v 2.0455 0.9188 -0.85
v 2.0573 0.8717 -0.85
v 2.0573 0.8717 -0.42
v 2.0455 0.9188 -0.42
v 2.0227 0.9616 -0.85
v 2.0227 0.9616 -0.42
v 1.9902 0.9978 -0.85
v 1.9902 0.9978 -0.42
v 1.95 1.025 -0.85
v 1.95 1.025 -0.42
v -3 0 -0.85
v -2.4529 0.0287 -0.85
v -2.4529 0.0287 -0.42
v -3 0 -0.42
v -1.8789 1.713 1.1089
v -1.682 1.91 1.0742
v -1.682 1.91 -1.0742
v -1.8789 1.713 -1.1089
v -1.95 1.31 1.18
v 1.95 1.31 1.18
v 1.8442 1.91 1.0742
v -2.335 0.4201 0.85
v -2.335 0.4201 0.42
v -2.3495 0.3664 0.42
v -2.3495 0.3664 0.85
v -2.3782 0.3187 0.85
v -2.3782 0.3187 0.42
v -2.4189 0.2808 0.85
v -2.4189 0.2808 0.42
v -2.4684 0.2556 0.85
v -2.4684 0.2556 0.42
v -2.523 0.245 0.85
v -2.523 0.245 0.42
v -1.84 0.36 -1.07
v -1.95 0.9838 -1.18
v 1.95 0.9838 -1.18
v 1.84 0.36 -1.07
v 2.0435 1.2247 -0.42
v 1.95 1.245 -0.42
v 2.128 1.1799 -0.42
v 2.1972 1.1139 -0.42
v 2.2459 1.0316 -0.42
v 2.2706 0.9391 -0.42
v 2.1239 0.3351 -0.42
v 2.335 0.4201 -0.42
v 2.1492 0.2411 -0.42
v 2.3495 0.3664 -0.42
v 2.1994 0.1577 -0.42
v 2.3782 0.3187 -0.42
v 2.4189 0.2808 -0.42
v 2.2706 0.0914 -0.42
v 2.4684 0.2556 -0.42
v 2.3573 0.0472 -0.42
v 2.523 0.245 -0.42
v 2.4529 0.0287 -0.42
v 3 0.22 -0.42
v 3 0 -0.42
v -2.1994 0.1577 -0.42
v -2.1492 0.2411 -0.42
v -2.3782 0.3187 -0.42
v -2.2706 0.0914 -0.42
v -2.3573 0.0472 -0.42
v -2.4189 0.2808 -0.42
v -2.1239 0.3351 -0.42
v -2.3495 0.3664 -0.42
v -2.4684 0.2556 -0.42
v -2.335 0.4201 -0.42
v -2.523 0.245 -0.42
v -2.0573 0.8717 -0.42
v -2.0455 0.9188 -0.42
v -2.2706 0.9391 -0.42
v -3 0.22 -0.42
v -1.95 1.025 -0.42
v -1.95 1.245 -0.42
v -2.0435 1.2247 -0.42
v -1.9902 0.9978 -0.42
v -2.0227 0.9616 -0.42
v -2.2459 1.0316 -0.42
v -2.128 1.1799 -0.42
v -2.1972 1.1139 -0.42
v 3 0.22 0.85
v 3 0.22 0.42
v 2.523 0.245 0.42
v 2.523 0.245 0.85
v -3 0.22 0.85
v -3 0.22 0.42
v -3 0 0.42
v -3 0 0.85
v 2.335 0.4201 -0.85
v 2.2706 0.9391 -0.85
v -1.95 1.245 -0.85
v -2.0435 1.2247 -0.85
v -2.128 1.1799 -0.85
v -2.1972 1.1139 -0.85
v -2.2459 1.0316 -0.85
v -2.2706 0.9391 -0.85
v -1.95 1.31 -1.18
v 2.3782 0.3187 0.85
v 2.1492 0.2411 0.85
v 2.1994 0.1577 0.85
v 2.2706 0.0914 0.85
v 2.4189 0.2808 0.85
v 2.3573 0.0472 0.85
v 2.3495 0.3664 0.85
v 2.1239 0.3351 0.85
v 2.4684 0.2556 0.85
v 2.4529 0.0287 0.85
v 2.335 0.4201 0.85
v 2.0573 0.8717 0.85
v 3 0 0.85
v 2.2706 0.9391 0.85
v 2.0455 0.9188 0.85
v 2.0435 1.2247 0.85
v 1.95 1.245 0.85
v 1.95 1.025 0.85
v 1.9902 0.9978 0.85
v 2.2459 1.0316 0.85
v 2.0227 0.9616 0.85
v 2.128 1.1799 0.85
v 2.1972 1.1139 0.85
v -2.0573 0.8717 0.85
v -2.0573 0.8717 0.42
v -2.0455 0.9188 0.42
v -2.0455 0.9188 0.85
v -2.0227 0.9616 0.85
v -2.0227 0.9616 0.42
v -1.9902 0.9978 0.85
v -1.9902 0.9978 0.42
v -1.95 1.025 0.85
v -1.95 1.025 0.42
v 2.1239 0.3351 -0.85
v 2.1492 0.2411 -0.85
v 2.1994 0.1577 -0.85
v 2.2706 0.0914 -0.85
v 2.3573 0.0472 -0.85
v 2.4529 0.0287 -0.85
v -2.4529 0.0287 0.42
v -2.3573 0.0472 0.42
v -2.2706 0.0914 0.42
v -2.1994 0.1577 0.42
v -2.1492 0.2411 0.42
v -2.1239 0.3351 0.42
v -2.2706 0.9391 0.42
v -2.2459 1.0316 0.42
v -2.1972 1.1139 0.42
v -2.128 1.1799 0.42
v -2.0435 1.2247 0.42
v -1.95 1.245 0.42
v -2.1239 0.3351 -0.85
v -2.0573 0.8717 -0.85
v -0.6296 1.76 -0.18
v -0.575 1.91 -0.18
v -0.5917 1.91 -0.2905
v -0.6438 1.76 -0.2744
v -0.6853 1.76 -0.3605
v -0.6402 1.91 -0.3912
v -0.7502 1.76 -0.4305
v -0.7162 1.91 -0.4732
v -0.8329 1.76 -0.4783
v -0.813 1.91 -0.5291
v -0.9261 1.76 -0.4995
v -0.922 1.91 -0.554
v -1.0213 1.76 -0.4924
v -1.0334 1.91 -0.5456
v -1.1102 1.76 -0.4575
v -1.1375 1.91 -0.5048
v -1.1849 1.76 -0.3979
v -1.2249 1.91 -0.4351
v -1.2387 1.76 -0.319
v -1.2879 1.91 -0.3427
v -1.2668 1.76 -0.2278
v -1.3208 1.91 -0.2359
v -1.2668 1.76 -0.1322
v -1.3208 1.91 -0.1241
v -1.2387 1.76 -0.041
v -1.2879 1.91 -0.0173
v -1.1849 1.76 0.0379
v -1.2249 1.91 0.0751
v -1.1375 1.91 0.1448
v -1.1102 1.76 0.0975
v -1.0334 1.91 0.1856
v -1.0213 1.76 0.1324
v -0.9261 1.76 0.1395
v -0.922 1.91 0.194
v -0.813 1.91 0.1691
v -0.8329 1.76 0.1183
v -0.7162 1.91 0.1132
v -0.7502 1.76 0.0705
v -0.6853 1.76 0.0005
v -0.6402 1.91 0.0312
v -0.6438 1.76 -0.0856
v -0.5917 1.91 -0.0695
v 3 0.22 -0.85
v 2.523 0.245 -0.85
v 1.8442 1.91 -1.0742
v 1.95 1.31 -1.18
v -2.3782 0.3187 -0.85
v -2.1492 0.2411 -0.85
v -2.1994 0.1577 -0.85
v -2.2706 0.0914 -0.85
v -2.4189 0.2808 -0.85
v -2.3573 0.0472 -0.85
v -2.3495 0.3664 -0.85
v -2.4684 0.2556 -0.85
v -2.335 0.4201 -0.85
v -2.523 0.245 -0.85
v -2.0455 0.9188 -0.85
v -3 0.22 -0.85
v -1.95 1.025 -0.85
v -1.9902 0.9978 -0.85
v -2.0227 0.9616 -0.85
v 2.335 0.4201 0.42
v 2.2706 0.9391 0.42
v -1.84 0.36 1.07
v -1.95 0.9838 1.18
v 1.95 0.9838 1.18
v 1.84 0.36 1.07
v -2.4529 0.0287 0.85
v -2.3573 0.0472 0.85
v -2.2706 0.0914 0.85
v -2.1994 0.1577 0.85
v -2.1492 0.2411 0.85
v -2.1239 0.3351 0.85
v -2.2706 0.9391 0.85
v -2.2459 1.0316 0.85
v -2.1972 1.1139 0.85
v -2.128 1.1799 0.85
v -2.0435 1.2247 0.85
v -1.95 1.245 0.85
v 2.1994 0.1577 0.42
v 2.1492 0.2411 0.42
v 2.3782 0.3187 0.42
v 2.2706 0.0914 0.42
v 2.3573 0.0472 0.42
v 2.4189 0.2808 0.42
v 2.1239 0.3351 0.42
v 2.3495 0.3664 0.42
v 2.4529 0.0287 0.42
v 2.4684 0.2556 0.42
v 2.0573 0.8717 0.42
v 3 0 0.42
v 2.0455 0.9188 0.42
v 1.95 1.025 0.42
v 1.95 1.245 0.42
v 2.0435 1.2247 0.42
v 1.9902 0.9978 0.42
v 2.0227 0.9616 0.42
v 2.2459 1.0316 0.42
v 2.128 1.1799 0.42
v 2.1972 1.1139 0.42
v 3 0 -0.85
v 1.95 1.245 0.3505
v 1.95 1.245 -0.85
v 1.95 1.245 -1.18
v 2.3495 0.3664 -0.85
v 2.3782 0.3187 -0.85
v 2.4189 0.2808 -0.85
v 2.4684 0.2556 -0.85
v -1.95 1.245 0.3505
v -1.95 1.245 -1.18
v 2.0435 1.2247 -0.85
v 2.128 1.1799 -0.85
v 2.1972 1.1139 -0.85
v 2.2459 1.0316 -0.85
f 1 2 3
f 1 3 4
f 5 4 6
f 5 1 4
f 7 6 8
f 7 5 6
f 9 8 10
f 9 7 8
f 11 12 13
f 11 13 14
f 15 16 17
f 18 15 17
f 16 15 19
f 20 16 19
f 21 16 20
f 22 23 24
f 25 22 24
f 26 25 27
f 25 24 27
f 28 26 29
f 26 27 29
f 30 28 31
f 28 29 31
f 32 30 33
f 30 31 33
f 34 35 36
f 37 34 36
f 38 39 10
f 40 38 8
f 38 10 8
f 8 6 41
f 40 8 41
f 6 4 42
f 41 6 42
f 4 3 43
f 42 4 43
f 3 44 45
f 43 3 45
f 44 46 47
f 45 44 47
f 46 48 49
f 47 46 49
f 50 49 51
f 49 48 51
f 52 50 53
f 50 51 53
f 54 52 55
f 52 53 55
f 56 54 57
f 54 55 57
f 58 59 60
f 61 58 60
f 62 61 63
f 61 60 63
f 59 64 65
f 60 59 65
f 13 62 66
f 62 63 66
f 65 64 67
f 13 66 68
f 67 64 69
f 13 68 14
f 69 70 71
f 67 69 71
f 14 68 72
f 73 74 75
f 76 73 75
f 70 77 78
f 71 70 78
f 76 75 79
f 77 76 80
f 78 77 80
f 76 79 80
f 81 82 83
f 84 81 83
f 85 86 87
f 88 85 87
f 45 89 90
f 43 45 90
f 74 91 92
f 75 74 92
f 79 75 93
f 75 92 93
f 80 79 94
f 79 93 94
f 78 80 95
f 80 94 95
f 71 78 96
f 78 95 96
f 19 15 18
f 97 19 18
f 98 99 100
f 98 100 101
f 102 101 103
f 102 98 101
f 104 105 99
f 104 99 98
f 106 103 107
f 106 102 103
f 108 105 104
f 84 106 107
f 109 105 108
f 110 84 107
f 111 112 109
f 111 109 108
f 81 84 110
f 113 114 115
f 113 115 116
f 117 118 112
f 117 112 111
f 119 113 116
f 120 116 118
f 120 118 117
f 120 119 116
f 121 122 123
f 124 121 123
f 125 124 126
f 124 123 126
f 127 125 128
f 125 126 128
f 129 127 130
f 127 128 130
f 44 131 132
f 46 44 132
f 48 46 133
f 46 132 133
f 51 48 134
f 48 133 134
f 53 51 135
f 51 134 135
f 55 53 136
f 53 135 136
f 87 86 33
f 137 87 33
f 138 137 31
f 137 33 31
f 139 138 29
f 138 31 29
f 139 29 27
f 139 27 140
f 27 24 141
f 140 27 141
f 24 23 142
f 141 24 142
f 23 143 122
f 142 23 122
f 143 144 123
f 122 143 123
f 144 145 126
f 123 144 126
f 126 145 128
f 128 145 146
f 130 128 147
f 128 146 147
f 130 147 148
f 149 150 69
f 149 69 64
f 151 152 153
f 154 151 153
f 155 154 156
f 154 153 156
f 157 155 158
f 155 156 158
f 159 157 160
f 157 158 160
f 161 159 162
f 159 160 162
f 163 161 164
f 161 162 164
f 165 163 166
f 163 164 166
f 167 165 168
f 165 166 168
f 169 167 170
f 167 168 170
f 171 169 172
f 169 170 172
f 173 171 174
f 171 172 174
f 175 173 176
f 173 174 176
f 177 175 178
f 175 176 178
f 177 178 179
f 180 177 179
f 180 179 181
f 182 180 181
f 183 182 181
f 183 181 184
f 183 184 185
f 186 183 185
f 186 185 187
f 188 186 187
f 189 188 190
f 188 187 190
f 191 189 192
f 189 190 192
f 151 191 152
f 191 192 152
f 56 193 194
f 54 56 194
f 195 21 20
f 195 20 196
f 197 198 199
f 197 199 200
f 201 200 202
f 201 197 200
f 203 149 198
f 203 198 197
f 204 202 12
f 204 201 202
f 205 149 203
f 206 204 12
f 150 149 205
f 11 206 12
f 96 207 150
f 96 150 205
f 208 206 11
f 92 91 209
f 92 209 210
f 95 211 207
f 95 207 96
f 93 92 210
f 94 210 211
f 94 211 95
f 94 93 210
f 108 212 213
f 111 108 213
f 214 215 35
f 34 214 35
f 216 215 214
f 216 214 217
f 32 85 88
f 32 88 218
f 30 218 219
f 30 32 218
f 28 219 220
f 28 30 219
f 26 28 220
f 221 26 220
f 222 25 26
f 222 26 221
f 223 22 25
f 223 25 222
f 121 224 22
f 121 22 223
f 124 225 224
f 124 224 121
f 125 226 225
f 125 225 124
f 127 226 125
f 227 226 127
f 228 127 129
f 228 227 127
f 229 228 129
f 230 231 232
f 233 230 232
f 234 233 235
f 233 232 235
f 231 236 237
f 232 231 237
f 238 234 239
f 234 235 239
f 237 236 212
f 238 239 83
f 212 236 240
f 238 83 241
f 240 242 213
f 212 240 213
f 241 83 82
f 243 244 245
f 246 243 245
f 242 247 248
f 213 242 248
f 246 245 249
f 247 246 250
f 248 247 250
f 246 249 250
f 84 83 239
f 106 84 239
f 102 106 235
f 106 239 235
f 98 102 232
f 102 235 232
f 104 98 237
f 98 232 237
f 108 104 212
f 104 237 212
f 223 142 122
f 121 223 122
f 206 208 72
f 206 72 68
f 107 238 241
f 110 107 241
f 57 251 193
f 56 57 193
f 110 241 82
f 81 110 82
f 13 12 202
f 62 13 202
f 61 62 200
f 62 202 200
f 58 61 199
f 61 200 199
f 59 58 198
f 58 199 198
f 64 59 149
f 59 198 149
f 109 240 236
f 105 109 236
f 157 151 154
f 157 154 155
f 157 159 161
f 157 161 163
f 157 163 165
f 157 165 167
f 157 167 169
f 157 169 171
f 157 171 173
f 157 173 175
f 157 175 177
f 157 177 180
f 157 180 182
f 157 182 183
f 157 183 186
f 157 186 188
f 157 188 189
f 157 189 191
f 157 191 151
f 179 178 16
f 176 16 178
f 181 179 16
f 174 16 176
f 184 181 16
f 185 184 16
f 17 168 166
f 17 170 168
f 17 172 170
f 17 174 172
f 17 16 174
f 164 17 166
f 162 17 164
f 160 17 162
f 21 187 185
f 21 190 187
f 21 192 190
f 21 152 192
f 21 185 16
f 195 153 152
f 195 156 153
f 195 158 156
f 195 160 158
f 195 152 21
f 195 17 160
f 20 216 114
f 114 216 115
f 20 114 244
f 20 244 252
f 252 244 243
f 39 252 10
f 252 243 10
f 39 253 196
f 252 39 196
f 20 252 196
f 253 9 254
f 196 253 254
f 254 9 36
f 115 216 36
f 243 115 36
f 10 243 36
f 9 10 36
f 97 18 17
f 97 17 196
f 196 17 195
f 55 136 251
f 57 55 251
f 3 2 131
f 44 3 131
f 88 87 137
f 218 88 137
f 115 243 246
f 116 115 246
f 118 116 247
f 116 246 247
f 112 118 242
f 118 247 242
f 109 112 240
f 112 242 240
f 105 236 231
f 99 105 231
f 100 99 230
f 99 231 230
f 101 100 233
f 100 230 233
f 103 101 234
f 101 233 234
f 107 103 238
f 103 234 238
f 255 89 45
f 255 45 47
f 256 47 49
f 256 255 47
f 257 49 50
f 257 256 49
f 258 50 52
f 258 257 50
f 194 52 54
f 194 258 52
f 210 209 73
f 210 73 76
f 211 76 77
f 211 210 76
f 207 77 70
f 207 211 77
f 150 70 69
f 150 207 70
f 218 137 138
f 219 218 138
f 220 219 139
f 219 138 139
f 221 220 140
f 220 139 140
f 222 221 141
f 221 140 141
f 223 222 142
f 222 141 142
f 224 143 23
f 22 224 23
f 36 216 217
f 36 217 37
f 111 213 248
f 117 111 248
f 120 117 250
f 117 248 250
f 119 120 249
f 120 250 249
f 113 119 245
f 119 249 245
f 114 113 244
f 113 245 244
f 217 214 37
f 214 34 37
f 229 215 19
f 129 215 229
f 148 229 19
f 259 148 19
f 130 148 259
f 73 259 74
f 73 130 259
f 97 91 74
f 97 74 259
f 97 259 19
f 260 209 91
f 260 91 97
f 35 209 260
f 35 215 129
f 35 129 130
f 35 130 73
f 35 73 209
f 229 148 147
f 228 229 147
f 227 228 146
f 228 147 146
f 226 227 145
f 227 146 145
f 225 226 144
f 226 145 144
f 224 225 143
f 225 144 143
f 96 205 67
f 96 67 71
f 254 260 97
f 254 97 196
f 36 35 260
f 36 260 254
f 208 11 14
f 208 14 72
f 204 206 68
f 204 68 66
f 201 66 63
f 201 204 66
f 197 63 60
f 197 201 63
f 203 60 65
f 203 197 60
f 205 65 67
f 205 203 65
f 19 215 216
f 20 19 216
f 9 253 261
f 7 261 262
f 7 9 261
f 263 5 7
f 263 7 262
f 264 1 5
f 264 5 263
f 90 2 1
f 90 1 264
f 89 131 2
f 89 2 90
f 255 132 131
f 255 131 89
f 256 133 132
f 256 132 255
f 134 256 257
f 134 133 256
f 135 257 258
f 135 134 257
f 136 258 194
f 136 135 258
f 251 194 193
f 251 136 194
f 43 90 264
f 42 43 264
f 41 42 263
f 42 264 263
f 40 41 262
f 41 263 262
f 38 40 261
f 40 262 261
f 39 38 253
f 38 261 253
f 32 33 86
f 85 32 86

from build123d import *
from OCP.BRepFilletAPI import BRepFilletAPI_MakeChamfer

# Parameters (mm, degrees)
SKETCH1_W            = 3.9
SKETCH1_H            = 2.36
BOSS_EXTRUDE1_DEPTH  = 1.55
CHAMFER1_SIZE        = 0.11
CHAMFER1_SIZE2       = 0.623841
CHAMFER2_SIZE        = 0.6
CHAMFER2_SIZE2       = 0.105796188
CHAMFER3_SIZE        = 0.2
CHAMFER3_SIZE2       = 0.162231915
SKETCH3_R            = 0.375
MARK_PIN1_DEPTH      = 0.15
MARK_PIN1_DRAFT      = -20
PIN_EXTRUDE_DEPTH    = 0.43
FILLET1_R            = 0.2
FILLET2_R            = 0.35
FILLET1_OF_MIRROR1_R = 0.2
FILLET2_OF_MIRROR1_R = 0.35
PIN_PATTERN_START    = 0.42
PIN_PATTERN_DEPTH    = 0.43


# Read off the part's stored shape, not the designer's step: pin_pattern
with BuildPart() as part:
    # Sketch1 → Boss-Extrude1 (new body)
    with BuildSketch(Plane(origin=(0, 0.36, 0), x_dir=(1, 0, 0), z_dir=(0, 1, 0))):
        Rectangle(SKETCH1_W, SKETCH1_H)
    extrude(amount=BOSS_EXTRUDE1_DEPTH)

    # Chamfer1
    chamfer1_edges = [part.edges().sort_by_distance(p)[0] for p in [
        (0, 0.36, 1.18),
        (-1.95, 0.36, 0),
        (0, 0.36, -1.18),
        (1.95, 0.36, 0),
    ]]
    chamfer1_side = [part.faces().sort_by_distance(p)[0] for p in [
        (0, 0.36, 0),
    ]]
    chamfer(chamfer1_edges, length=CHAMFER1_SIZE, length2=CHAMFER1_SIZE2, reference=chamfer1_side[0])

    # Chamfer2: one chamfer whose edges measure the first distance from different faces: ONE call of the kernel's chamfer builder (chamfer() names one face for all edges)
    chamfer2_edges_1 = [part.edges().sort_by_distance(p)[0] for p in [
        (-1.95, 1.91, 0),
    ]]
    chamfer2_side_1 = [part.faces().sort_by_distance(p)[0] for p in [
        (-1.95, 1.4469205, 0),
    ]]
    chamfer2_edges_2 = [part.edges().sort_by_distance(p)[0] for p in [
        (0, 1.91, 1.18),
    ]]
    chamfer2_side_2 = [part.faces().sort_by_distance(p)[0] for p in [
        (0, 1.4469205, 1.18),
    ]]
    chamfer2_edges_3 = [part.edges().sort_by_distance(p)[0] for p in [
        (1.95, 1.91, 0),
    ]]
    chamfer2_side_3 = [part.faces().sort_by_distance(p)[0] for p in [
        (1.95, 1.4469205, 0),
    ]]
    chamfer2_edges_4 = [part.edges().sort_by_distance(p)[0] for p in [
        (0, 1.91, -1.18),
    ]]
    chamfer2_side_4 = [part.faces().sort_by_distance(p)[0] for p in [
        (0, 1.4469205, -1.18),
    ]]
    chamfer2 = BRepFilletAPI_MakeChamfer(part.part.solid().wrapped)
    for e in chamfer2_edges_1:
        chamfer2.Add(CHAMFER2_SIZE, CHAMFER2_SIZE2, e.wrapped, chamfer2_side_1[0].wrapped)  # the first distance lies on this face
    for e in chamfer2_edges_2:
        chamfer2.Add(CHAMFER2_SIZE, CHAMFER2_SIZE2, e.wrapped, chamfer2_side_2[0].wrapped)  # the first distance lies on this face
    for e in chamfer2_edges_3:
        chamfer2.Add(CHAMFER2_SIZE, CHAMFER2_SIZE2, e.wrapped, chamfer2_side_3[0].wrapped)  # the first distance lies on this face
    for e in chamfer2_edges_4:
        chamfer2.Add(CHAMFER2_SIZE, CHAMFER2_SIZE2, e.wrapped, chamfer2_side_4[0].wrapped)  # the first distance lies on this face
    add(Compound.cast(chamfer2.Shape()), mode=Mode.REPLACE)

    # Chamfer3
    chamfer3_edges = [part.edges().sort_by_distance(p)[0] for p in [
        (-1.844203812, 1.91, 0),
    ]]
    chamfer3_side = [part.faces().sort_by_distance(p)[0] for p in [
        (-1.897929458, 1.605306716, 0),
    ]]
    chamfer(chamfer3_edges, length=CHAMFER3_SIZE, length2=CHAMFER3_SIZE2, reference=chamfer3_side[0])


with BuildPart() as mark_pin1_tool:
    # Sketch3 → mark pin1 (with draft: the straight prism first)
    with BuildSketch(Plane(origin=(0, 1.91, 0), x_dir=(1, 0, 0), z_dir=(0, 1, 0))):
        with Locations((-0.95, 0.18)):
            Circle(SKETCH3_R)
    extrude(amount=-MARK_PIN1_DEPTH)
    # mark pin1: the draft: its side faces are tilted about the plane it starts from
    mark_pin1_sides = [mark_pin1_tool.faces().sort_by_distance(p)[0] for p in [
        (-1.325, 1.835, -0.18),
    ]]
    draft(mark_pin1_sides, Plane(origin=(0, 1.91, 0), x_dir=(1, 0, 0), z_dir=(0, 1, 0)), MARK_PIN1_DRAFT)


with BuildPart() as part_1:
    add(part.part)

    # mark pin1: cut by mark_pin1_tool
    add(mark_pin1_tool.part, mode=Mode.SUBTRACT)

    # Sketch2 → pin extrude (add)
    with BuildSketch(Plane(origin=(0, 0, -0.85), x_dir=(-1, 0, 0), z_dir=(0, 0, -1))):
        Polygon((3, 0), (3, 0.22), (2.355650355, 0.253768934), (2.232596609, 1.245), (0, 1.245), (0, 1.025), (2.038219161, 1.025), (2.16, 0.044022535), align=None)
    pin_extrude = extrude(amount=-PIN_EXTRUDE_DEPTH)

    # Fillet1
    # the kernel refuses this fillet: 0.2 mm, written as the material it adds along each edge
    with BuildSketch(Plane(origin=(-2.355650355, 0.253768934, -0.85), x_dir=(0.1231966593163618, 0.9923822767126025, 0), z_dir=(0, 0, 1))) as fillet1_piece_1:
        with BuildLine():
            CenterArc((FILLET1_R * 0.837960751352, FILLET1_R), FILLET1_R, 190.076627033, 79.923372967)
            Line((-FILLET1_R * 0.146613884969, FILLET1_R * 0.825034902013), (-FILLET1_R * 0.166305377696, FILLET1_R * 0.821535600054))
            Line((-FILLET1_R * 0.166305377696, FILLET1_R * 0.821535600054), (-FILLET1_R * 0.016759215027, -FILLET1_R * 0.02))
            Line((-FILLET1_R * 0.016759215027, -FILLET1_R * 0.02), (FILLET1_R * 0.837960751352, -FILLET1_R * 0.02))
            Line((FILLET1_R * 0.837960751352, -FILLET1_R * 0.02), (FILLET1_R * 0.837960751352, 0))
        make_face()
    extrude(amount=0.43)
    with BuildSketch(Plane(origin=(-2.038219161, 1.025, -0.85), x_dir=(1, 0, 0), z_dir=(0, 0, 1))) as fillet1_piece_2:
        with BuildLine():
            CenterArc((0.179439713, -0.177985423), FILLET1_R, 117.135910173, 55.787462794)
            Line((-0.019036743, -0.153346091), (-0.023006272, -0.152853305))
            Line((-0.023006272, -0.152853305), (-0.003969529, 0.000492787))
            Line((-0.003969529, 0.000492787), (0, 0.004))
            ThreePointArc((0, 0.004), (0.04410958, 0.004), (0.08639475, 0.003559708))
            Line((0.08639475, 0.003559708), (0.088219161, 0))
        make_face()
    extrude(amount=0.43)

    # Fillet2
    # the kernel refuses this fillet: 0.35 mm, written as the material it takes off along each edge
    with BuildSketch(Plane(origin=(-2.16, 0.044022535, -1.583215657), x_dir=(0.12319665931636148, 0.9923822767126025, 0), z_dir=(0, 0, 1))) as fillet2_piece_1:
        with BuildLine():
            CenterArc((FILLET2_R * 0.837960751352, FILLET2_R), FILLET2_R, 190.076627033, 79.923372967)
            Line((-FILLET2_R * 0.146613884969, FILLET2_R * 0.825034902013), (-FILLET2_R * 0.166305377696, FILLET2_R * 0.821535600054))
            Line((-FILLET2_R * 0.166305377696, FILLET2_R * 0.821535600054), (-FILLET2_R * 0.016759215027, -FILLET2_R * 0.02))
            Line((-FILLET2_R * 0.016759215027, -FILLET2_R * 0.02), (FILLET2_R * 0.837960751352, -FILLET2_R * 0.02))
            Line((FILLET2_R * 0.837960751352, -FILLET2_R * 0.02), (FILLET2_R * 0.837960751352, 0))
        make_face()
    extrude(amount=1.896431315, mode=Mode.SUBTRACT)
    with BuildSketch(Plane(origin=(-2.232596609, 1.245, -1.620509776), x_dir=(1, 0, 0), z_dir=(0, 0, 1))) as fillet2_piece_2:
        with BuildLine():
            CenterArc((0.309364105, -0.348974929), FILLET2_R, 94.386181504, 78.537191463)
            Line((-0.037969692, -0.305856098), (-0.044916368, -0.304993722))
            Line((-0.044916368, -0.304993722), (-0.006946676, 0.000862377))
            Line((-0.006946676, 0.000862377), (0, 0.007))
            ThreePointArc((0, 0.007), (0.141298305, 0.007), (0.282061259, 0.006979499))
            Line((0.282061259, 0.006979499), (0.282596609, 0))
        make_face()
    extrude(amount=1.971019553, mode=Mode.SUBTRACT)

    # Mirror1: pin extrude across plane
    add(pin_extrude.mirror(Plane(origin=(0, 0, 0), x_dir=(0, 0, 1), z_dir=(1, 0, 0))))

    # Fillet1 of Mirror1
    # the kernel refuses this fillet: 0.2 mm, written as the material it adds along each edge
    with BuildSketch(Plane(origin=(2.355650355, 0.253768934, -0.85), x_dir=(-0.1231966593163618, 0.9923822767126025, 0), z_dir=(0, 0, 1))) as fillet1_of_mirror1_piece_1:
        with BuildLine():
            CenterArc((FILLET1_OF_MIRROR1_R * 0.837960751352, -FILLET1_OF_MIRROR1_R), FILLET1_OF_MIRROR1_R, 90, 79.923372967)
            Line((-FILLET1_OF_MIRROR1_R * 0.146613884969, -FILLET1_OF_MIRROR1_R * 0.825034902013), (-FILLET1_OF_MIRROR1_R * 0.166305377696, -FILLET1_OF_MIRROR1_R * 0.821535600054))
            Line((-FILLET1_OF_MIRROR1_R * 0.166305377696, -FILLET1_OF_MIRROR1_R * 0.821535600054), (-FILLET1_OF_MIRROR1_R * 0.016759215027, FILLET1_OF_MIRROR1_R * 0.02))
            Line((-FILLET1_OF_MIRROR1_R * 0.016759215027, FILLET1_OF_MIRROR1_R * 0.02), (FILLET1_OF_MIRROR1_R * 0.837960751352, FILLET1_OF_MIRROR1_R * 0.02))
            Line((FILLET1_OF_MIRROR1_R * 0.837960751352, FILLET1_OF_MIRROR1_R * 0.02), (FILLET1_OF_MIRROR1_R * 0.837960751352, 0))
        make_face()
    extrude(amount=0.43)
    with BuildSketch(Plane(origin=(2.038219161, 1.025, -0.85), x_dir=(-1, 0, 0), z_dir=(0, 0, 1))) as fillet1_of_mirror1_piece_2:
        with BuildLine():
            CenterArc((0.179439713, 0.177985423), FILLET1_OF_MIRROR1_R, 187.076627033, 55.787462794)
            Line((-0.019036743, 0.153346091), (-0.023006272, 0.152853305))
            Line((-0.023006272, 0.152853305), (-0.003969529, -0.000492787))
            Line((-0.003969529, -0.000492787), (0, -0.004))
            ThreePointArc((0, -0.004), (0.04410958, -0.004), (0.08639475, -0.003559708))
            Line((0.08639475, -0.003559708), (0.088219161, 0))
        make_face()
    extrude(amount=0.43)

    # Fillet2 of Mirror1
    # the kernel refuses this fillet: 0.35 mm, written as the material it takes off along each edge
    with BuildSketch(Plane(origin=(2.16, 0.044022535, -1.583215657), x_dir=(-0.12319665931636148, 0.9923822767126025, 0), z_dir=(0, 0, 1))) as fillet2_of_mirror1_piece_1:
        with BuildLine():
            CenterArc((FILLET2_OF_MIRROR1_R * 0.837960751352, -FILLET2_OF_MIRROR1_R), FILLET2_OF_MIRROR1_R, 90, 79.923372967)
            Line((-FILLET2_OF_MIRROR1_R * 0.146613884969, -FILLET2_OF_MIRROR1_R * 0.825034902013), (-FILLET2_OF_MIRROR1_R * 0.166305377696, -FILLET2_OF_MIRROR1_R * 0.821535600054))
            Line((-FILLET2_OF_MIRROR1_R * 0.166305377696, -FILLET2_OF_MIRROR1_R * 0.821535600054), (-FILLET2_OF_MIRROR1_R * 0.016759215027, FILLET2_OF_MIRROR1_R * 0.02))
            Line((-FILLET2_OF_MIRROR1_R * 0.016759215027, FILLET2_OF_MIRROR1_R * 0.02), (FILLET2_OF_MIRROR1_R * 0.837960751352, FILLET2_OF_MIRROR1_R * 0.02))
            Line((FILLET2_OF_MIRROR1_R * 0.837960751352, FILLET2_OF_MIRROR1_R * 0.02), (FILLET2_OF_MIRROR1_R * 0.837960751352, 0))
        make_face()
    extrude(amount=1.896431315, mode=Mode.SUBTRACT)
    with BuildSketch(Plane(origin=(2.232596609, 1.245, -1.620509776), x_dir=(-1, 0, 0), z_dir=(0, 0, 1))) as fillet2_of_mirror1_piece_2:
        with BuildLine():
            CenterArc((0.309364105, 0.348974929), FILLET2_OF_MIRROR1_R, 187.076627033, 78.537191463)
            Line((-0.037969692, 0.305856098), (-0.044916368, 0.304993722))
            Line((-0.044916368, 0.304993722), (-0.006946676, -0.000862377))
            Line((-0.006946676, -0.000862377), (0, -0.007))
            ThreePointArc((0, -0.007), (0.141298305, -0.007), (0.282061259, -0.006979499))
            Line((0.282061259, -0.006979499), (0.282596609, 0))
        make_face()
    extrude(amount=1.971019553, mode=Mode.SUBTRACT)

    # pin_pattern outline → pin_pattern (add)
    with BuildSketch(Plane.XY.offset(PIN_PATTERN_START)):
        with BuildLine():
            Line((-3, 0.22), (-3, 0))
            Line((-3, 0), (-2.452884324, 0.028673118))
            ThreePointArc((-2.452884324, 0.028673118), (-2.232673705, 0.122060099), (-2.123868112, 0.335074624))
            Line((-2.123868112, 0.335074624), (-2.057255903, 0.871653909))
            ThreePointArc((-2.057255903, 0.871653909), (-2.022669182, 0.961645092), (-1.95, 1.025))
            Line((-1.95, 1.025), (-1.95, 1.245))
            ThreePointArc((-1.95, 1.245), (-2.164841553, 1.149254349), (-2.270566301, 0.939143902))
            Line((-2.270566301, 0.939143902), (-2.335003562, 0.420084414))
            ThreePointArc((-2.335003562, 0.420084414), (-2.397178186, 0.298361828), (-2.523012826, 0.244997839))
            Line((-2.523012826, 0.244997839), (-3, 0.22))
        make_face()
        with BuildLine():
            Line((2.452884324, 0.028673118), (3, 0))
            Line((3, 0), (3, 0.22))
            Line((3, 0.22), (2.523012826, 0.244997839))
            ThreePointArc((2.523012826, 0.244997839), (2.397178186, 0.298361828), (2.335003562, 0.420084414))
            Line((2.335003562, 0.420084414), (2.270566301, 0.939143902))
            ThreePointArc((2.270566301, 0.939143902), (2.164841553, 1.149254349), (1.95, 1.245))
            Line((1.95, 1.245), (1.95, 1.025))
            ThreePointArc((1.95, 1.025), (2.022669182, 0.961645092), (2.057255903, 0.871653909))
            Line((2.057255903, 0.871653909), (2.123868112, 0.335074624))
            ThreePointArc((2.123868112, 0.335074624), (2.232673705, 0.122060099), (2.452884324, 0.028673118))
        make_face()
    extrude(amount=PIN_PATTERN_DEPTH)


solid = part_1.part
